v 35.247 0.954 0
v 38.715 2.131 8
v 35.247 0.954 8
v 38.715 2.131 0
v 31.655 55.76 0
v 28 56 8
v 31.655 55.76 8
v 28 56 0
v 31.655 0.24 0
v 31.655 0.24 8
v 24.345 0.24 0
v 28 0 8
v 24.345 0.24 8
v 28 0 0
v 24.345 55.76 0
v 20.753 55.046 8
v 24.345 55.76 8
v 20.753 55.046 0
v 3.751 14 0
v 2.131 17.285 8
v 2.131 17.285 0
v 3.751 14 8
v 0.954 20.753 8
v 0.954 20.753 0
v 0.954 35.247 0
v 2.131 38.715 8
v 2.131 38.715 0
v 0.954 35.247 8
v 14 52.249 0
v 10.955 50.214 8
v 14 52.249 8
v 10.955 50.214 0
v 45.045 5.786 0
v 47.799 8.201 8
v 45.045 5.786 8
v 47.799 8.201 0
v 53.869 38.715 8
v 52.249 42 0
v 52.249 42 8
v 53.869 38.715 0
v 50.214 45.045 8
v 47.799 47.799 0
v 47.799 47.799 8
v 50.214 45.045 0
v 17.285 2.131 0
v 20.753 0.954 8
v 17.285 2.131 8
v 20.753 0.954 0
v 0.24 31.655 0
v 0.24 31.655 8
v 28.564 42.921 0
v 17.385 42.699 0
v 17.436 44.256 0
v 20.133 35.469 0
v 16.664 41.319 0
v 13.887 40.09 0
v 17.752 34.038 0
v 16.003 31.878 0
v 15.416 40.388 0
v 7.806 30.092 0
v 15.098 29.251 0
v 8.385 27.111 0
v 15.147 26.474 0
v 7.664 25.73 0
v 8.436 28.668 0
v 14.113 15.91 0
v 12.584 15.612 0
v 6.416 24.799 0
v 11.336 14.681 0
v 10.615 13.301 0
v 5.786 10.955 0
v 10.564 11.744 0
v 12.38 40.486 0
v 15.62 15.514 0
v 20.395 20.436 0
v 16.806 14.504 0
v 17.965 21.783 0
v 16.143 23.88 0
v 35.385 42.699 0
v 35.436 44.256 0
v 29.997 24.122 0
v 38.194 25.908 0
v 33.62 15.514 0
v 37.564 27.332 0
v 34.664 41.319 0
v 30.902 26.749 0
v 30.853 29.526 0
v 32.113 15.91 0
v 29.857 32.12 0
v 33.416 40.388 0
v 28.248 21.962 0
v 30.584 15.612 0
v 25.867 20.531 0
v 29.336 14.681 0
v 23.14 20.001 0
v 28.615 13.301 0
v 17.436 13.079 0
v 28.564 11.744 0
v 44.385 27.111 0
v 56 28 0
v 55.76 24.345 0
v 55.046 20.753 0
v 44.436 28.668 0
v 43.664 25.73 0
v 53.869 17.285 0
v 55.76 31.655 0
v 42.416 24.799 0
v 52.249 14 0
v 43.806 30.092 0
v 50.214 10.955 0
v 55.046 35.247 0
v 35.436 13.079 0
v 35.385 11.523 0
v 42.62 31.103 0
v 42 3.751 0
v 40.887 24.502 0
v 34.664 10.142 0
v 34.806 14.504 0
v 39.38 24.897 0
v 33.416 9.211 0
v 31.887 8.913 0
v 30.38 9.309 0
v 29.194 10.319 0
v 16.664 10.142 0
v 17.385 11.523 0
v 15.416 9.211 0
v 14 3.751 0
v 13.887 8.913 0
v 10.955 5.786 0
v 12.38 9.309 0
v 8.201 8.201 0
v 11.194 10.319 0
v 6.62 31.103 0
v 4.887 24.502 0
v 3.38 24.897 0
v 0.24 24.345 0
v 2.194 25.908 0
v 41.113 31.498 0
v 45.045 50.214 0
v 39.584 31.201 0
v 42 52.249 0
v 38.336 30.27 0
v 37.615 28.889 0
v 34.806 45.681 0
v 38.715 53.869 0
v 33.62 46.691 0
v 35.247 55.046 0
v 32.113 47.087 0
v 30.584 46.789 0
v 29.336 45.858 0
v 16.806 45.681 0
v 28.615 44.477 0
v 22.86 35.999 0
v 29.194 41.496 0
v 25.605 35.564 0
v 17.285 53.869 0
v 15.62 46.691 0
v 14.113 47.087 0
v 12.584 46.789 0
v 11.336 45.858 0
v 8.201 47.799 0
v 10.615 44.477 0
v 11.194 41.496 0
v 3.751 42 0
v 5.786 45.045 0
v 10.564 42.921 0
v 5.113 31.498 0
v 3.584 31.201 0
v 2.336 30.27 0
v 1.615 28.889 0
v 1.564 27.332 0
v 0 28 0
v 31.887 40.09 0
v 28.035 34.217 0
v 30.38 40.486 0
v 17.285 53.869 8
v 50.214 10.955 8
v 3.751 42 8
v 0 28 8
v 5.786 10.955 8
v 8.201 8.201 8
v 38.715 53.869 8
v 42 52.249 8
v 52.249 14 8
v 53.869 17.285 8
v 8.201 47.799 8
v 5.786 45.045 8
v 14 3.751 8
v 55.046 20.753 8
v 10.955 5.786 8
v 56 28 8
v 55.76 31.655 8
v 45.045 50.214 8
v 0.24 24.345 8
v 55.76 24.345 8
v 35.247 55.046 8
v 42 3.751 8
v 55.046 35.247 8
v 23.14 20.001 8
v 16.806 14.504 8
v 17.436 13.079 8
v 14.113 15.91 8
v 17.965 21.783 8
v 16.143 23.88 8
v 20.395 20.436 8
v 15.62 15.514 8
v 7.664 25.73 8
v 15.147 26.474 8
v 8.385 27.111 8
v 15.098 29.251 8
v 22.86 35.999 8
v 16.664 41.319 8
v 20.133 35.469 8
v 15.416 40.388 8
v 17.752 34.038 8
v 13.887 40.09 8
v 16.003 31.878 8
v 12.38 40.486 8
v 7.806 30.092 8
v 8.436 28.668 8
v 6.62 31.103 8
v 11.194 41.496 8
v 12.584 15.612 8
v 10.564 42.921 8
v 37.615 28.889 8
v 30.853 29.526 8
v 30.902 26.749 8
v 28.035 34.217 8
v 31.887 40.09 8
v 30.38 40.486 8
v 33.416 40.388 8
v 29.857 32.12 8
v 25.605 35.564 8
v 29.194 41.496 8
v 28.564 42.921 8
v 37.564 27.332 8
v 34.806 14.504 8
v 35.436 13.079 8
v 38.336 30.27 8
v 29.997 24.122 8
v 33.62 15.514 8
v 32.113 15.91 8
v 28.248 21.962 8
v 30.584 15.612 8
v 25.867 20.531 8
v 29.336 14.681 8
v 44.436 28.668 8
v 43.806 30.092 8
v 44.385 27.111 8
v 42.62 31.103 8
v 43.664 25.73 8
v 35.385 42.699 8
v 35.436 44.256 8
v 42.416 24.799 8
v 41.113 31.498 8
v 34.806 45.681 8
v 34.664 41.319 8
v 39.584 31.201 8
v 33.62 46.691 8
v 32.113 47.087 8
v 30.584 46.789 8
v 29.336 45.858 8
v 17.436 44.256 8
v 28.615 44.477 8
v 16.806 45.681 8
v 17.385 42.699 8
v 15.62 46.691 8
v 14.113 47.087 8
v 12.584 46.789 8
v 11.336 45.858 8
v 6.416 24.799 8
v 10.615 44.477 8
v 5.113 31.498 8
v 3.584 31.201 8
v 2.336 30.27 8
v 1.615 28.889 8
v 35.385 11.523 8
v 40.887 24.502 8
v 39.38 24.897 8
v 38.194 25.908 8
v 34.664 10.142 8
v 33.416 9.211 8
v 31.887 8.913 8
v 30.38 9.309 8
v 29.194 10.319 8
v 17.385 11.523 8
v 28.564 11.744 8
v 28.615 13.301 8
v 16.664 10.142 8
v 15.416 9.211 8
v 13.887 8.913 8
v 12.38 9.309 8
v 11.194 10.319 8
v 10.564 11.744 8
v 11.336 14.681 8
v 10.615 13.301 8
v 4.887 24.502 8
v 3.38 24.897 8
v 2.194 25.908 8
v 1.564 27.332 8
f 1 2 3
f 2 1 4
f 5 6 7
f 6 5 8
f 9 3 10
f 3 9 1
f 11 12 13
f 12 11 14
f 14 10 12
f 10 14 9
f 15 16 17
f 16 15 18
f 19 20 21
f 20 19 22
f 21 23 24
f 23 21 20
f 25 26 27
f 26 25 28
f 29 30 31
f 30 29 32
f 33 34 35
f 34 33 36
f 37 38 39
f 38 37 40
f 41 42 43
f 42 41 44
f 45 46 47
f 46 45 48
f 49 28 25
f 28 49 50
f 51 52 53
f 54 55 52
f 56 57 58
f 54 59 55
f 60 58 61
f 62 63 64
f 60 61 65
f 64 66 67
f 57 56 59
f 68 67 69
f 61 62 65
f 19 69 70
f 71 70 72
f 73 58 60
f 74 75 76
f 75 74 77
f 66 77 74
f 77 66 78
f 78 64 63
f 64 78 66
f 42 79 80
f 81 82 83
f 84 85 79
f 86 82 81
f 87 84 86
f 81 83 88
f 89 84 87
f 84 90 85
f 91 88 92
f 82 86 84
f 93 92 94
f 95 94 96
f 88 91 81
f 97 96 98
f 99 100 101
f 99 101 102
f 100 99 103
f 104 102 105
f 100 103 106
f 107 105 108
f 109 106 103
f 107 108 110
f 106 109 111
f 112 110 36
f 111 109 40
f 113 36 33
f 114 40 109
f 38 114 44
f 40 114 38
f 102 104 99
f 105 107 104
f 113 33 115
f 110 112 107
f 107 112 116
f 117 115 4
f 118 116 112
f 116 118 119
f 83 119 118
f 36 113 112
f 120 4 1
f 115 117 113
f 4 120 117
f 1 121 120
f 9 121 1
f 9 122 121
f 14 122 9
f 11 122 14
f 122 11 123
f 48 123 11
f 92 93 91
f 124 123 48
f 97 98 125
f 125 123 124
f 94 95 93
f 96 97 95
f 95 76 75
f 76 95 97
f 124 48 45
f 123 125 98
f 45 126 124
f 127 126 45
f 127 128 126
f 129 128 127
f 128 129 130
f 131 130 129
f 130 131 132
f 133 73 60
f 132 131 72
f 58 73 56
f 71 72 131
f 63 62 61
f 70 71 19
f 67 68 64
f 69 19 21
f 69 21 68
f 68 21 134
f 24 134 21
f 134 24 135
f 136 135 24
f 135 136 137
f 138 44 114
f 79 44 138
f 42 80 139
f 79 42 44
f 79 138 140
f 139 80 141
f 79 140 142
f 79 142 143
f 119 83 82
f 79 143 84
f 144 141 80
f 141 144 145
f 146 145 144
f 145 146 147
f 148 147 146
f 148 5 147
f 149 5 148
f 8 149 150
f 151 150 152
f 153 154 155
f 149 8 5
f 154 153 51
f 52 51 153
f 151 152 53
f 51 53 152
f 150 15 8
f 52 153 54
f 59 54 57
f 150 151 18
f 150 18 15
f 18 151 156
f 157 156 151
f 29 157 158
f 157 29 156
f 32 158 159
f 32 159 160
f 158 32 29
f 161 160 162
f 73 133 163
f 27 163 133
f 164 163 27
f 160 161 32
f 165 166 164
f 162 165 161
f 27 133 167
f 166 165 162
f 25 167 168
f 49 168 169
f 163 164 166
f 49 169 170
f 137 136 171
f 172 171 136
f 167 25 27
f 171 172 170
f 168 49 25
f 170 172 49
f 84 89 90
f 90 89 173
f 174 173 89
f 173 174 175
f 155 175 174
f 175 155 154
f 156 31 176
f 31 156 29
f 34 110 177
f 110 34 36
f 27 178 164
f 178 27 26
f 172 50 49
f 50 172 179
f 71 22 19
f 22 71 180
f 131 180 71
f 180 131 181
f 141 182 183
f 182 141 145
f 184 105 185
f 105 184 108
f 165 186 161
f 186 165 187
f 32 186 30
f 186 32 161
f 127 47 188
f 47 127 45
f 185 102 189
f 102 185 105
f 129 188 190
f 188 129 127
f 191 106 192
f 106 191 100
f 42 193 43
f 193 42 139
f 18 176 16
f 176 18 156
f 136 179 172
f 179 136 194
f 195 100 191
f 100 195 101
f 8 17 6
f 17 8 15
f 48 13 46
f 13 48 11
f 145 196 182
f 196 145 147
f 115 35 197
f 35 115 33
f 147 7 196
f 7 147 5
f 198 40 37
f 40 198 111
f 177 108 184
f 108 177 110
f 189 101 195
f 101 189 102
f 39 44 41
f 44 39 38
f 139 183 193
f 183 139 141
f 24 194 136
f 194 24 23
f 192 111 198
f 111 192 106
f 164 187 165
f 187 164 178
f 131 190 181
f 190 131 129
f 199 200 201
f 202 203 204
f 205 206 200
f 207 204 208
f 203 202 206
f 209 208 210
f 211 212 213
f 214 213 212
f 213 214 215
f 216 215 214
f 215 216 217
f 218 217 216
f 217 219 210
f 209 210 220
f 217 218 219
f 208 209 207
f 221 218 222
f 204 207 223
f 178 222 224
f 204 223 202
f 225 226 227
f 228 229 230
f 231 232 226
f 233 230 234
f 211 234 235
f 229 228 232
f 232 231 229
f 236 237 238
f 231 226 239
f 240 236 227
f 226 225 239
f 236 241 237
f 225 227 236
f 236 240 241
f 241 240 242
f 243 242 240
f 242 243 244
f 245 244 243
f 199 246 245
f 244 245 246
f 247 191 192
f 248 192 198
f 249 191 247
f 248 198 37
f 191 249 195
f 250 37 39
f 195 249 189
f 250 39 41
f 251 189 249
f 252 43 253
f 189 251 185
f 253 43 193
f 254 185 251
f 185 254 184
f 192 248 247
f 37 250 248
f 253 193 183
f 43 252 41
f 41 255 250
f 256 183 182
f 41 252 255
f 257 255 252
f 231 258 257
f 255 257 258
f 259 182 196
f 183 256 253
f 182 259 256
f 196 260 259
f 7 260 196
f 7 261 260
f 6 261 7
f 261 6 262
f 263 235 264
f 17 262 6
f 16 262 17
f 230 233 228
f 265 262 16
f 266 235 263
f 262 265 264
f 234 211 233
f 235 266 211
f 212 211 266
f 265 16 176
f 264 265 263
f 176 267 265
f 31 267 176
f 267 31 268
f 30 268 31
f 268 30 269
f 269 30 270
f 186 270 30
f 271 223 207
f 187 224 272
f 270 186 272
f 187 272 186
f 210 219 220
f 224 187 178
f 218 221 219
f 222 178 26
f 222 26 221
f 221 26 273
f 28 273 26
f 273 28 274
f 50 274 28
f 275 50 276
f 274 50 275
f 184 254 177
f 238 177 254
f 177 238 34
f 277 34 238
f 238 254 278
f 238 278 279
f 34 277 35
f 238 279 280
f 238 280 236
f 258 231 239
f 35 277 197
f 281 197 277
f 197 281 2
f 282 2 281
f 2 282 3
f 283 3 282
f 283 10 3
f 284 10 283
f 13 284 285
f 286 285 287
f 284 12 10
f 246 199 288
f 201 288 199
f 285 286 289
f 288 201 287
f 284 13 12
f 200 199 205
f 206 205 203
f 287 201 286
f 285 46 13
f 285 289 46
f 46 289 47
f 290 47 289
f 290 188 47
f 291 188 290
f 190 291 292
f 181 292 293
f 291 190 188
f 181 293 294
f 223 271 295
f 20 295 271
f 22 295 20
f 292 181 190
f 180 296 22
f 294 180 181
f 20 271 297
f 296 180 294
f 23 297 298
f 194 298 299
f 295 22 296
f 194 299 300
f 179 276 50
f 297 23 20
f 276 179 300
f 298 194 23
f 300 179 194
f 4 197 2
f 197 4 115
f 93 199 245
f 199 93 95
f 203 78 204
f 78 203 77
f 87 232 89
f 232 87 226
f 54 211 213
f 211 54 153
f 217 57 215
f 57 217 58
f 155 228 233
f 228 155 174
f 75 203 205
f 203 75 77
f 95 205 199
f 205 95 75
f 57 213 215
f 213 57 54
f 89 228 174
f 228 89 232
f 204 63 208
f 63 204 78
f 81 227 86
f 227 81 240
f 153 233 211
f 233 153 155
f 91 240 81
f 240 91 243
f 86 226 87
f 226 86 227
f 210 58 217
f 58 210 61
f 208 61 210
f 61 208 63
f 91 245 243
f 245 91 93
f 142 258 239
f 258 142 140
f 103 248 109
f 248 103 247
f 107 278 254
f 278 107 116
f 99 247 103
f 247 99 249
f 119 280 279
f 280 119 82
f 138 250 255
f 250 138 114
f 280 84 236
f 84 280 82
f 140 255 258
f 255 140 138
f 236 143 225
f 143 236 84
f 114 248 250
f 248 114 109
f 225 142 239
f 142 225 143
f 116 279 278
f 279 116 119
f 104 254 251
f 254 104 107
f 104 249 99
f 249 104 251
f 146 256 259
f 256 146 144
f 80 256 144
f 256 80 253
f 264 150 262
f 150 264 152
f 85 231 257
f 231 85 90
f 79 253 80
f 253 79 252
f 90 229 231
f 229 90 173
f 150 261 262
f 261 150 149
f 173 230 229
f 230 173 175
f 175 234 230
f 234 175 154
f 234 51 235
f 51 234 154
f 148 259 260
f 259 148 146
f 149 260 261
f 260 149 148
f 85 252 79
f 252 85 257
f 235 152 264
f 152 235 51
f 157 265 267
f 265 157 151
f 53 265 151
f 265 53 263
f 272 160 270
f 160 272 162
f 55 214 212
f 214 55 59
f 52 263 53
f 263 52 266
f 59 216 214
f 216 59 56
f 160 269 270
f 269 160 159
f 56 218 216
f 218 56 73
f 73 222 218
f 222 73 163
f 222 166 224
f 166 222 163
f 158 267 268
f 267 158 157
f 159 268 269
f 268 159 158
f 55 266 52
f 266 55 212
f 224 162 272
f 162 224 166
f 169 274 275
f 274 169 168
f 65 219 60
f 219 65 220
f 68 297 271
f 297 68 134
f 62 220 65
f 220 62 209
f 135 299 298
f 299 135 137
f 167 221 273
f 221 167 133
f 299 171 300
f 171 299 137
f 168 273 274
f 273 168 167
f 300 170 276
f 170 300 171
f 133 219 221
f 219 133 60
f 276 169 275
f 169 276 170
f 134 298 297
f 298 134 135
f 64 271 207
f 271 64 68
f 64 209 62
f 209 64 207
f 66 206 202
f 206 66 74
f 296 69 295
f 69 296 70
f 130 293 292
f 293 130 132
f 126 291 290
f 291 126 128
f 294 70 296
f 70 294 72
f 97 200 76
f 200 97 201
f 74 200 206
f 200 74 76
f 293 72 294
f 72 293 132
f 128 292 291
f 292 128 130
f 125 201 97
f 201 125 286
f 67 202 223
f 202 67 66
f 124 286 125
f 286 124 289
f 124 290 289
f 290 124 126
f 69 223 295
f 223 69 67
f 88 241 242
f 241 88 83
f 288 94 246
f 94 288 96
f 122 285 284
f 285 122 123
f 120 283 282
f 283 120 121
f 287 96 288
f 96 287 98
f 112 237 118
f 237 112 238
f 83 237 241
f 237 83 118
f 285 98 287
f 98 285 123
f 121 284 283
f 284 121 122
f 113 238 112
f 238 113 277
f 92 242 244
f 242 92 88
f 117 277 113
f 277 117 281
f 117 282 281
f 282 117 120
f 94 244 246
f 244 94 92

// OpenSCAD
$fn = 32;

// ----------------------------------------------------------------------
// Cam plate: eccentric cam, base R28
// ----------------------------------------------------------------------

// --- parameters (mm) ---
base_r = 28;              // base circle radius
lobe_h = 10;              // cam lobe rise
bore_r = 8;               // shaft bore radius
plate_t = 8;              // plate thickness, Z (extrusion height)
ecc = 5;                  // disc eccentricity
ring_r = 18;              // lightening ring radius
bolt_r = 3.5;             // lightening hole radius

profile = [[56, 28], [55.76, 31.655], [55.046, 35.247], [53.869, 38.715], [52.249, 42], [50.214, 45.045], [47.799, 47.799], [45.045, 50.214], [42, 52.249], [38.715, 53.869], [35.247, 55.046], [31.655, 55.76], [28, 56], [24.345, 55.76], [20.753, 55.046], [17.285, 53.869], [14, 52.249], [10.955, 50.214], [8.201, 47.799], [5.786, 45.045], [3.751, 42], [2.131, 38.715], [0.954, 35.247], [0.24, 31.655], [0, 28], [0.24, 24.345], [0.954, 20.753], [2.131, 17.285], [3.751, 14], [5.786, 10.955], [8.201, 8.201], [10.955, 5.786], [14, 3.751], [17.285, 2.131], [20.753, 0.954], [24.345, 0.24], [28, 0], [31.655, 0.24], [35.247, 0.954], [38.715, 2.131], [42, 3.751], [45.045, 5.786], [47.799, 8.201], [50.214, 10.955], [52.249, 14], [53.869, 17.285], [55.046, 20.753], [55.76, 24.345]];  // primary outline, 48 points, counter clockwise
void_1 = [[30.853, 29.526], [29.857, 32.12], [28.035, 34.217], [25.605, 35.564], [22.86, 35.999], [20.133, 35.469], [17.752, 34.038], [16.003, 31.878], [15.098, 29.251], [15.147, 26.474], [16.143, 23.88], [17.965, 21.783], [20.395, 20.436], [23.14, 20.001], [25.867, 20.531], [28.248, 21.962], [29.997, 24.122], [30.902, 26.749]];  // shaft bore, 18 points
void_2 = [[44.436, 28.668], [43.806, 30.092], [42.62, 31.103], [41.113, 31.498], [39.584, 31.201], [38.336, 30.27], [37.615, 28.889], [37.564, 27.332], [38.194, 25.908], [39.38, 24.897], [40.887, 24.502], [42.416, 24.799], [43.664, 25.73], [44.385, 27.111]];  // lightening hole 1, 14 points
void_3 = [[35.436, 44.256], [34.806, 45.681], [33.62, 46.691], [32.113, 47.087], [30.584, 46.789], [29.336, 45.858], [28.615, 44.477], [28.564, 42.921], [29.194, 41.496], [30.38, 40.486], [31.887, 40.09], [33.416, 40.388], [34.664, 41.319], [35.385, 42.699]];  // lightening hole 2, 14 points
void_4 = [[17.436, 44.256], [16.806, 45.681], [15.62, 46.691], [14.113, 47.087], [12.584, 46.789], [11.336, 45.858], [10.615, 44.477], [10.564, 42.921], [11.194, 41.496], [12.38, 40.486], [13.887, 40.09], [15.416, 40.388], [16.664, 41.319], [17.385, 42.699]];  // lightening hole 3, 14 points
void_5 = [[8.436, 28.668], [7.806, 30.092], [6.62, 31.103], [5.113, 31.498], [3.584, 31.201], [2.336, 30.27], [1.615, 28.889], [1.564, 27.332], [2.194, 25.908], [3.38, 24.897], [4.887, 24.502], [6.416, 24.799], [7.664, 25.73], [8.385, 27.111]];  // lightening hole 4, 14 points
void_6 = [[17.436, 13.079], [16.806, 14.504], [15.62, 15.514], [14.113, 15.91], [12.584, 15.612], [11.336, 14.681], [10.615, 13.301], [10.564, 11.744], [11.194, 10.319], [12.38, 9.309], [13.887, 8.913], [15.416, 9.211], [16.664, 10.142], [17.385, 11.523]];  // lightening hole 5, 14 points
void_7 = [[35.436, 13.079], [34.806, 14.504], [33.62, 15.514], [32.113, 15.91], [30.584, 15.612], [29.336, 14.681], [28.615, 13.301], [28.564, 11.744], [29.194, 10.319], [30.38, 9.309], [31.887, 8.913], [33.416, 9.211], [34.664, 10.142], [35.385, 11.523]];  // lightening hole 6, 14 points

// --- the one profile operation ---
difference() {
  linear_extrude(height = plate_t) polygon(points = profile);
  translate([0, 0, -1])
    linear_extrude(height = plate_t + 2) polygon(points = void_1);
  translate([0, 0, -1])
    linear_extrude(height = plate_t + 2) polygon(points = void_2);
  translate([0, 0, -1])
    linear_extrude(height = plate_t + 2) polygon(points = void_3);
  translate([0, 0, -1])
    linear_extrude(height = plate_t + 2) polygon(points = void_4);
  translate([0, 0, -1])
    linear_extrude(height = plate_t + 2) polygon(points = void_5);
  translate([0, 0, -1])
    linear_extrude(height = plate_t + 2) polygon(points = void_6);
  translate([0, 0, -1])
    linear_extrude(height = plate_t + 2) polygon(points = void_7);
}
